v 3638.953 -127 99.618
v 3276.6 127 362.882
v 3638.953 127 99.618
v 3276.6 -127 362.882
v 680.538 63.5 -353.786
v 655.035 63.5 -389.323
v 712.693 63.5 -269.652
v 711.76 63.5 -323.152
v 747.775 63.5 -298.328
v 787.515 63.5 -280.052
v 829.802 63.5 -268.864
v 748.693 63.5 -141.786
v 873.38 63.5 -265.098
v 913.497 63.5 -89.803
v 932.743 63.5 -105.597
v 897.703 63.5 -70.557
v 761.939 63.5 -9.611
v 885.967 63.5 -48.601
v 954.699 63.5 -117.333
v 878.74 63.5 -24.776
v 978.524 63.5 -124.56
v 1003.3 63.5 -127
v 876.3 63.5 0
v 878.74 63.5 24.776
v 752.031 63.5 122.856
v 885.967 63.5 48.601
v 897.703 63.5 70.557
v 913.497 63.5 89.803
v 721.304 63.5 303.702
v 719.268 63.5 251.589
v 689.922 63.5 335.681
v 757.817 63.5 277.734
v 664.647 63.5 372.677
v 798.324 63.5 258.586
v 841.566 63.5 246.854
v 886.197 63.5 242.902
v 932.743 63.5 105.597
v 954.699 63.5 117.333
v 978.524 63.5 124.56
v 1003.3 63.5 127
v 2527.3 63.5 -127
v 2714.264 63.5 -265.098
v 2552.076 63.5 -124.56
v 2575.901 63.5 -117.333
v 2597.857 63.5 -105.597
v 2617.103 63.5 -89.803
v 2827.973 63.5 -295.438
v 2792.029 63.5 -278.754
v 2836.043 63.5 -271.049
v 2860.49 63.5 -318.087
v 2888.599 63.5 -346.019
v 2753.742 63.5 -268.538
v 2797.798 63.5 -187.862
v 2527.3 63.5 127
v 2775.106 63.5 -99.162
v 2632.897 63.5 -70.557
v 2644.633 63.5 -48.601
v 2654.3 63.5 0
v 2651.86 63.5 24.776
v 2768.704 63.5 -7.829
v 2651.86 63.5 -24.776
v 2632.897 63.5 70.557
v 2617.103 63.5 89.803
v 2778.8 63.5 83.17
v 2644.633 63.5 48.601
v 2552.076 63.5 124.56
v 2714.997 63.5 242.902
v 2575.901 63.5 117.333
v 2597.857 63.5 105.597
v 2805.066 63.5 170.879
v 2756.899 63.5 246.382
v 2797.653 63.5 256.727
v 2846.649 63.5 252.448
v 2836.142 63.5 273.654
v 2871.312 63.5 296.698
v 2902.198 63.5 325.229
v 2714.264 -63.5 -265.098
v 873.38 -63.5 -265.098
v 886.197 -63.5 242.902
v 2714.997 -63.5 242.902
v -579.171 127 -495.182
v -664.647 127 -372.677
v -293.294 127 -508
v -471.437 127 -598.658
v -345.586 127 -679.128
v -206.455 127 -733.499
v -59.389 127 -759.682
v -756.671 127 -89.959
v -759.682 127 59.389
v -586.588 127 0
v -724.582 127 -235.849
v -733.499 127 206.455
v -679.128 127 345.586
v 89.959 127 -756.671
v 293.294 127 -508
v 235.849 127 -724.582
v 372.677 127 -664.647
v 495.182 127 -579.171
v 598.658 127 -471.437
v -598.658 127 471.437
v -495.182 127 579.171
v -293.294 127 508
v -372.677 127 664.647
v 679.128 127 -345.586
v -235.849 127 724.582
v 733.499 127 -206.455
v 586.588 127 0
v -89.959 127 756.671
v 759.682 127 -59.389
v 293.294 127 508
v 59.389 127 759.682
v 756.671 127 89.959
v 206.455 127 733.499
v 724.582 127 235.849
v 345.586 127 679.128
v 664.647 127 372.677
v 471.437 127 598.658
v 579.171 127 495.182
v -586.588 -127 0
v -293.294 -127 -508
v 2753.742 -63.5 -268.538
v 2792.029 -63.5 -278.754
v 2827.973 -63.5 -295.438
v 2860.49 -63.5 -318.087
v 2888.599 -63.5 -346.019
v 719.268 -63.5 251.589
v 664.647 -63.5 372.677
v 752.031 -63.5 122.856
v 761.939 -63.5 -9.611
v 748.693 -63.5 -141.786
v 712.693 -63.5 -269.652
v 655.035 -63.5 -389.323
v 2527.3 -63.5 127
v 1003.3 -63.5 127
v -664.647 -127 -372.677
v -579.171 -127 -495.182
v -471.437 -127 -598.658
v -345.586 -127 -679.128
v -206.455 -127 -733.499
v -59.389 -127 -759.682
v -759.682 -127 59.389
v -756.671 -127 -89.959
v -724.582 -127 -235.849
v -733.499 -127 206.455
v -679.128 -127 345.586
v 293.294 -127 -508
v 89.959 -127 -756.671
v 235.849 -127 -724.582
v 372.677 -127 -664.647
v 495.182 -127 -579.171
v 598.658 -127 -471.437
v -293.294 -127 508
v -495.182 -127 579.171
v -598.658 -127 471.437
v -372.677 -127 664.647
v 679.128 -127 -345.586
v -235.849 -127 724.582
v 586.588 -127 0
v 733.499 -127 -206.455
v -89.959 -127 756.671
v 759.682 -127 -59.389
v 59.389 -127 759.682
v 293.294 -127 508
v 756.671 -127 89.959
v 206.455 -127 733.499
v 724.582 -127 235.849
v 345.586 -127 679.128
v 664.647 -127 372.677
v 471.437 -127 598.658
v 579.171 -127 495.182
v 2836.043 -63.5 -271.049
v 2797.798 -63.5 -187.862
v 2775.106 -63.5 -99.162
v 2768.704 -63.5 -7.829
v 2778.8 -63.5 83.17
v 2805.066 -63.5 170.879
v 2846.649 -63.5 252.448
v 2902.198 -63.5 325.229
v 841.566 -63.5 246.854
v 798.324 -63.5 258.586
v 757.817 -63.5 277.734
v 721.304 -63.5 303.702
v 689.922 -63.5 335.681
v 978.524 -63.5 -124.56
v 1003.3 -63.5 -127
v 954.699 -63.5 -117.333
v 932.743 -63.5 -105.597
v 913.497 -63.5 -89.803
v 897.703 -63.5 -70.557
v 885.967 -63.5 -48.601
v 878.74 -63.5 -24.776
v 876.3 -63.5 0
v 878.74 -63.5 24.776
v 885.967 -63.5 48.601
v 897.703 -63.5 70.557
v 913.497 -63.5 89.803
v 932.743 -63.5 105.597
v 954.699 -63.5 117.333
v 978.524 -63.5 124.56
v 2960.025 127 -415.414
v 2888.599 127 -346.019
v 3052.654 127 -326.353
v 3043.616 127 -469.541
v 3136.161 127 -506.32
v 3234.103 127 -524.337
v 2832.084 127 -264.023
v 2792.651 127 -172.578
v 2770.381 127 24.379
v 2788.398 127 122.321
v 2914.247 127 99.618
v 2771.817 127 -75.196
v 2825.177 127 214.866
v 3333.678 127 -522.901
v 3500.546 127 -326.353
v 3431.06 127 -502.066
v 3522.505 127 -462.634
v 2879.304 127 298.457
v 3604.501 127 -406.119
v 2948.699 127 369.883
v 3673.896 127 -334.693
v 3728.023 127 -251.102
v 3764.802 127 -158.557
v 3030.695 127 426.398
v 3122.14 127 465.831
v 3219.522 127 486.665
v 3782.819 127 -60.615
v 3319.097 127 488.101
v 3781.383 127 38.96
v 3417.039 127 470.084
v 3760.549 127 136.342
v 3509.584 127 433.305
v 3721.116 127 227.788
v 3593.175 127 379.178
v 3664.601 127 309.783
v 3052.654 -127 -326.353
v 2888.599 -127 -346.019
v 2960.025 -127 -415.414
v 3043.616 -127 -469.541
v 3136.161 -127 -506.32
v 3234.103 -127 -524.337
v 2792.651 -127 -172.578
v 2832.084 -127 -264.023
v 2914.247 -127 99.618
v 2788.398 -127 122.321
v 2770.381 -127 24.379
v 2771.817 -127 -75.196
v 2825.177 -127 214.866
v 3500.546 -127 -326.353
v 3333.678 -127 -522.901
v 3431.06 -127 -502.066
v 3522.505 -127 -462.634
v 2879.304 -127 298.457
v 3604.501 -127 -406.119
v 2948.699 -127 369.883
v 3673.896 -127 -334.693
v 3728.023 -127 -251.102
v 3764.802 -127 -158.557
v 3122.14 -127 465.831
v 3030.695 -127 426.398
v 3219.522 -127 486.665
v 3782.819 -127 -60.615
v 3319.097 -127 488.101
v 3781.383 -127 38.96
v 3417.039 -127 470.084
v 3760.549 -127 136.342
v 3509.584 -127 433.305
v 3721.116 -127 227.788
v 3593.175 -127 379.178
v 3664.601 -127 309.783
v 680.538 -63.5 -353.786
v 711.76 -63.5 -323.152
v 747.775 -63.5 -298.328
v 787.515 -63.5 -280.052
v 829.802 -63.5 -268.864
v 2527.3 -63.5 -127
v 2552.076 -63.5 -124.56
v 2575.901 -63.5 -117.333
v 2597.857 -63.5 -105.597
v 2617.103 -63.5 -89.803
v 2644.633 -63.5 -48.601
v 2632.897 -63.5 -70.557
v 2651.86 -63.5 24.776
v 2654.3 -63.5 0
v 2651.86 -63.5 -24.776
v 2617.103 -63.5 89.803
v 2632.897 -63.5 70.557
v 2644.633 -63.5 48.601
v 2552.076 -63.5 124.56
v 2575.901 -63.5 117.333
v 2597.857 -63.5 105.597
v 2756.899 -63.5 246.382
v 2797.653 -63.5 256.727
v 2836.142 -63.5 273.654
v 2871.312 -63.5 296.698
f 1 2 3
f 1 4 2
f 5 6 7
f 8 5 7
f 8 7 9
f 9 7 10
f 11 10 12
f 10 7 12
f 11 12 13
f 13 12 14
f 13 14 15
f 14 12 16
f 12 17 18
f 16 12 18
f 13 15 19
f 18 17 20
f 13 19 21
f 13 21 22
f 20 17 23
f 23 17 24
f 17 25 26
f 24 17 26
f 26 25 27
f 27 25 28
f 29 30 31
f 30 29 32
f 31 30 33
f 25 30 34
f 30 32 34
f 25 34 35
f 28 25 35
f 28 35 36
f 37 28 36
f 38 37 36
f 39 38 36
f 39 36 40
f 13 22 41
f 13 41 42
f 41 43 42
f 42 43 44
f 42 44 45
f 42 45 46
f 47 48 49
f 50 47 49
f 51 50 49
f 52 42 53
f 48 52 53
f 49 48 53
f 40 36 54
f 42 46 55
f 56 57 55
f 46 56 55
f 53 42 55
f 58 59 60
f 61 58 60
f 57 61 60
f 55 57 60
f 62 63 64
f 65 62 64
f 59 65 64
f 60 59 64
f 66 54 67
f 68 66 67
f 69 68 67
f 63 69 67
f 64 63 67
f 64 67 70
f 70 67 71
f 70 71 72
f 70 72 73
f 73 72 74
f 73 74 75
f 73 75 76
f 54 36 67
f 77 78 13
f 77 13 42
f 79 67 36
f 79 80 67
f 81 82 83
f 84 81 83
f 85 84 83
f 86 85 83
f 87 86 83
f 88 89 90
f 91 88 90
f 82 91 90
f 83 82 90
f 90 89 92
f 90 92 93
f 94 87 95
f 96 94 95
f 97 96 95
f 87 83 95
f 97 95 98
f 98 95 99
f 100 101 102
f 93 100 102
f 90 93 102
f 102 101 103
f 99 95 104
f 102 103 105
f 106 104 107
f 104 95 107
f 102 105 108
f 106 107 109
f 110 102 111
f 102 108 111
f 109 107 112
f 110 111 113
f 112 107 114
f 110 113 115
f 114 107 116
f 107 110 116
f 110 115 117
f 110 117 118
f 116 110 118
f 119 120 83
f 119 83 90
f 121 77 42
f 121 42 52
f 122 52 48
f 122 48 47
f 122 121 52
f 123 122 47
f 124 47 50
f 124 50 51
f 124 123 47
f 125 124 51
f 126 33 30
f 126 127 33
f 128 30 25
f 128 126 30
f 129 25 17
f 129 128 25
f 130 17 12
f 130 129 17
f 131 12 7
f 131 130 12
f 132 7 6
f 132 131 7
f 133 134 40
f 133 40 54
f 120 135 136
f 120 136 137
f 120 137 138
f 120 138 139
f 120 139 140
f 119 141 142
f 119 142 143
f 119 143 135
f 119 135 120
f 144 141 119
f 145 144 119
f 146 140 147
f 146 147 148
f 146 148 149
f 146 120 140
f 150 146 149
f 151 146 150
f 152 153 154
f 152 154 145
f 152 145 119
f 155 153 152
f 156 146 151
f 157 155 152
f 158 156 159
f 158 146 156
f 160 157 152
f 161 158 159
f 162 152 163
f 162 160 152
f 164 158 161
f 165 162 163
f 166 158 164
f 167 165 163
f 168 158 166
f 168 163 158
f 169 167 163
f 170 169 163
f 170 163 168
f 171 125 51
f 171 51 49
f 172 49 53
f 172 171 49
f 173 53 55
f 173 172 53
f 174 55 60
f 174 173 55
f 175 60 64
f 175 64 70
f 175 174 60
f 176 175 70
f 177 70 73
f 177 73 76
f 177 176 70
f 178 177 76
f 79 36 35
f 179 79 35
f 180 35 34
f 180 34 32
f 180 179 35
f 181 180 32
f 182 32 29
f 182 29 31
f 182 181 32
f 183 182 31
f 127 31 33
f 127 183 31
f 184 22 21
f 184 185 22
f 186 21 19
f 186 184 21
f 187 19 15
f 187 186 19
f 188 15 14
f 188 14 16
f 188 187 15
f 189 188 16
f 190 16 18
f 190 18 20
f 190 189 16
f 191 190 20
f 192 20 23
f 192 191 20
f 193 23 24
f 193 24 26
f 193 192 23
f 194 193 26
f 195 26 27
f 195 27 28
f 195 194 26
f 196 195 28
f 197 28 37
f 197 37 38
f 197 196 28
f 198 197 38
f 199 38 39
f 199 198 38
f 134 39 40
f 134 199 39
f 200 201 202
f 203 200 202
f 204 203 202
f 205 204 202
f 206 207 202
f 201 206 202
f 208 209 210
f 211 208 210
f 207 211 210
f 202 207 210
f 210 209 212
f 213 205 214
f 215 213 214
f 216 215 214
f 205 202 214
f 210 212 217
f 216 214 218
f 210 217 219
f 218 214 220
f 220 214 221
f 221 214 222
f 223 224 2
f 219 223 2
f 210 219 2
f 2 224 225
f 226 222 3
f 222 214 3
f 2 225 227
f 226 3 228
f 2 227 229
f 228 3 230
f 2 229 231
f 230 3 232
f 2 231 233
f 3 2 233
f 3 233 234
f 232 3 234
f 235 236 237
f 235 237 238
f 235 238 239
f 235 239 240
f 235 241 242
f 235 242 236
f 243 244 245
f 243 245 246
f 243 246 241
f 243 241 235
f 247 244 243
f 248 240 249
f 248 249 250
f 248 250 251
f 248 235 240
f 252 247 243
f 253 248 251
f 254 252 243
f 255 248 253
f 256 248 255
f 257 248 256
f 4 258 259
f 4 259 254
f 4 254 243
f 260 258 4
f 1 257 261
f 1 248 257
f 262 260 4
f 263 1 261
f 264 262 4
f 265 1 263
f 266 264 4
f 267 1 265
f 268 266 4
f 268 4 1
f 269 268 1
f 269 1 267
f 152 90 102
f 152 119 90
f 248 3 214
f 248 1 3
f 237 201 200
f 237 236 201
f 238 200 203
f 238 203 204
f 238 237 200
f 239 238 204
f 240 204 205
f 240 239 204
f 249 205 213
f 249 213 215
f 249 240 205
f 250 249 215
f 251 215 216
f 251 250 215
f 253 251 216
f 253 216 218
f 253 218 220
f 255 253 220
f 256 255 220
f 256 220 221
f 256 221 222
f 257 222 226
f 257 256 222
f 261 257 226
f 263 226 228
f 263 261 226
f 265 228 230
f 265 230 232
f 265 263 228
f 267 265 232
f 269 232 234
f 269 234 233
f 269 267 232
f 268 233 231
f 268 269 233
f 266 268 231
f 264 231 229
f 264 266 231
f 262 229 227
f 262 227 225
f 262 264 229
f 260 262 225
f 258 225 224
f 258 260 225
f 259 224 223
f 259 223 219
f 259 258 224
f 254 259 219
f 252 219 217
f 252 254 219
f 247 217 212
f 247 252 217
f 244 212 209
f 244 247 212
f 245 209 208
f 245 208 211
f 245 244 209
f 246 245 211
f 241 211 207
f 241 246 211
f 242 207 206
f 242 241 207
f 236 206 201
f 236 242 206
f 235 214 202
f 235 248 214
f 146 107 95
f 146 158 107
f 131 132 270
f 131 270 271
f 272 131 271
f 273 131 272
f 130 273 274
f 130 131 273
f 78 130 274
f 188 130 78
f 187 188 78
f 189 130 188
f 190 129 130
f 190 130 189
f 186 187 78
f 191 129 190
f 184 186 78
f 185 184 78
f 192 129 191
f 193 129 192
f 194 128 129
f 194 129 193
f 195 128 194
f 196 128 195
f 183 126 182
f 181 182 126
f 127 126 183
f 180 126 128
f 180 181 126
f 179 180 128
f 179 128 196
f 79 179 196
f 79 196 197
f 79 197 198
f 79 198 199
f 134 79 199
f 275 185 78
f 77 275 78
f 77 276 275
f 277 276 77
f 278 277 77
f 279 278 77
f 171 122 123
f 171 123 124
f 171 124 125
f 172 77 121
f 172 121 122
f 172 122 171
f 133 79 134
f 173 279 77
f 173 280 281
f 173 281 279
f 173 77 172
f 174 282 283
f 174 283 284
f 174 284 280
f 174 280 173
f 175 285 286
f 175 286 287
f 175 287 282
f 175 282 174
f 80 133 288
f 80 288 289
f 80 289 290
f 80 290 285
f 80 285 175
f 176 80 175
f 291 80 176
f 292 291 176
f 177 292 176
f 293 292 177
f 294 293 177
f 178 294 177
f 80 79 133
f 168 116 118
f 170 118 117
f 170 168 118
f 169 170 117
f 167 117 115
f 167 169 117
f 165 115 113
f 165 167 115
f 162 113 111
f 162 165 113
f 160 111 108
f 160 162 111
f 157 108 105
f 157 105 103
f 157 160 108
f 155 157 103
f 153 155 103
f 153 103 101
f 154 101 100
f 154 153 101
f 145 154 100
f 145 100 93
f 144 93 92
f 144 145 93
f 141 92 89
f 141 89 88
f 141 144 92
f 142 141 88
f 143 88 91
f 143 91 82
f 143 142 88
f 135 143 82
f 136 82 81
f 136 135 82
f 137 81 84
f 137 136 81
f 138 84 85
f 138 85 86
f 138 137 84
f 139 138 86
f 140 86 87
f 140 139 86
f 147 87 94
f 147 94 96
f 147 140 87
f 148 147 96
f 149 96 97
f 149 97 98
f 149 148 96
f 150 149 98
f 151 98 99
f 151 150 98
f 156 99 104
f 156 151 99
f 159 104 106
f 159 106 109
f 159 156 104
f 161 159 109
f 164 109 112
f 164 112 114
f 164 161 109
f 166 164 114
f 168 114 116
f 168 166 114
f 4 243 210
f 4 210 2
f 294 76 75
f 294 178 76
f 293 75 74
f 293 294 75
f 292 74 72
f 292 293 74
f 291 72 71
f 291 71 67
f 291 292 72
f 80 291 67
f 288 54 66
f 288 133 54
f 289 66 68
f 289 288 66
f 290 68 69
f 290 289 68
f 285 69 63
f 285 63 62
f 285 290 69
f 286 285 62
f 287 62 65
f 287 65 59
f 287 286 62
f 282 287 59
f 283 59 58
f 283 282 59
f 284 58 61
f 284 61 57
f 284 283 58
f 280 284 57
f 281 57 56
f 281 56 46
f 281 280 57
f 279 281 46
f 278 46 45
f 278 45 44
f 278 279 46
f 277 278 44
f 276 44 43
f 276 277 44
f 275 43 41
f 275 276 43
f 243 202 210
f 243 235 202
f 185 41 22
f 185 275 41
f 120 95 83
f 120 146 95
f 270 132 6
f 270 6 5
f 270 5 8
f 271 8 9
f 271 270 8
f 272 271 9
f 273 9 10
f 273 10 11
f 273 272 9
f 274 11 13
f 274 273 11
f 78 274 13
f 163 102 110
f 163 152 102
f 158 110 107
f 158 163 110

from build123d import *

# Parameters (mm, degrees)
F1_DEPTH = 127
F2_DEPTH = 63.5


with BuildPart() as f1:
    # F0 (on Front) → F1 (new body, symmetric)
    with BuildSketch(Plane.XZ):
        with BuildLine():
            ThreePointArc((655.0352990122, -389.3234606957), (734.772378988, -201.8750878052), (762, 0))
            ThreePointArc((762, 0), (737.2602445585, 192.5910999853), (664.647423114, 372.6765393043))
            ThreePointArc((664.647423114, 372.6765393043), (-761.9393819521, 9.6113594455), (655.0352990122, -389.3234606957))
        make_face()
        Polygon((-293.2939367483, -508), (-586.5878734967, 0), (-293.2939367483, 508), (293.2939367483, 508), (586.5878734967, 0), (293.2939367483, -508), align=None, mode=Mode.SUBTRACT)
    extrude(amount=F1_DEPTH, both=True)


with BuildPart() as f1b:
    # F0 (on Front) → F1, piece 2 (new body, symmetric)
    with BuildSketch(Plane.XZ):
        with BuildLine():
            ThreePointArc((3784.6, -18.1179286083), (3460.8113411178, 455.3059636949), (2902.1977094347, 325.2287254011))
            ThreePointArc((2902.1977094347, 325.2287254011), (2768.7042145878, -7.8285573693), (2888.5990161929, -346.0191889973))
            ThreePointArc((2888.5990161929, -346.0191889973), (3451.1845070818, -495.1758390207), (3784.6, -18.1179286083))
        make_face()
        Polygon((2914.2474672915, 99.6175462485), (3276.6, 362.8820713917), (3638.9525327085, 99.6175462485), (3500.5461811234, -326.3534034652), (3052.6538188766, -326.3534034652), align=None, mode=Mode.SUBTRACT)
    extrude(amount=F1_DEPTH, both=True)


with BuildPart() as f2:
    # F0 (on Front) → F2 (new body, symmetric)
    with BuildSketch(Plane.XZ):
        with BuildLine():
            ThreePointArc((664.647423114, 372.6765393043), (737.2602445585, 192.5910999853), (762, 0))
            ThreePointArc((762, 0), (734.772378988, -201.8750878052), (655.0352990122, -389.3234606957))
            ThreePointArc((655.0352990122, -389.3234606957), (747.7753025925, -298.3280224773), (873.3803986829, -265.0979475942))
            Line((873.3803986829, -265.0979475942), (2714.26397452, -265.0979475942))
            ThreePointArc((2714.26397452, -265.0979475942), (2810.3641228879, -286.3143010807), (2888.5990161929, -346.0191889973))
            ThreePointArc((2888.5990161929, -346.0191889973), (2768.7042145878, -7.8285573693), (2902.1977094347, 325.2287254011))
            ThreePointArc((2902.1977094347, 325.2287254011), (2817.2486422258, 264.3928858562), (2714.9965641521, 242.9020524058))
            Line((2714.9965641521, 242.9020524058), (886.1965641521, 242.9020524058))
            ThreePointArc((886.1965641521, 242.9020524058), (757.8168156085, 277.733988665), (664.647423114, 372.6765393043))
        make_face()
        with BuildLine():
            Line((1003.3, 127), (1765.3, 127))
            Line((1765.3, 127), (2527.3, 127))
            ThreePointArc((2527.3, 127), (2654.3, 0), (2527.3, -127))
            Line((2527.3, -127), (1003.3, -127))
            ThreePointArc((1003.3, -127), (876.3, 0), (1003.3, 127))
        make_face(mode=Mode.SUBTRACT)
    extrude(amount=F2_DEPTH, both=True)


solid = Compound([f1.part, f1b.part, f2.part])
